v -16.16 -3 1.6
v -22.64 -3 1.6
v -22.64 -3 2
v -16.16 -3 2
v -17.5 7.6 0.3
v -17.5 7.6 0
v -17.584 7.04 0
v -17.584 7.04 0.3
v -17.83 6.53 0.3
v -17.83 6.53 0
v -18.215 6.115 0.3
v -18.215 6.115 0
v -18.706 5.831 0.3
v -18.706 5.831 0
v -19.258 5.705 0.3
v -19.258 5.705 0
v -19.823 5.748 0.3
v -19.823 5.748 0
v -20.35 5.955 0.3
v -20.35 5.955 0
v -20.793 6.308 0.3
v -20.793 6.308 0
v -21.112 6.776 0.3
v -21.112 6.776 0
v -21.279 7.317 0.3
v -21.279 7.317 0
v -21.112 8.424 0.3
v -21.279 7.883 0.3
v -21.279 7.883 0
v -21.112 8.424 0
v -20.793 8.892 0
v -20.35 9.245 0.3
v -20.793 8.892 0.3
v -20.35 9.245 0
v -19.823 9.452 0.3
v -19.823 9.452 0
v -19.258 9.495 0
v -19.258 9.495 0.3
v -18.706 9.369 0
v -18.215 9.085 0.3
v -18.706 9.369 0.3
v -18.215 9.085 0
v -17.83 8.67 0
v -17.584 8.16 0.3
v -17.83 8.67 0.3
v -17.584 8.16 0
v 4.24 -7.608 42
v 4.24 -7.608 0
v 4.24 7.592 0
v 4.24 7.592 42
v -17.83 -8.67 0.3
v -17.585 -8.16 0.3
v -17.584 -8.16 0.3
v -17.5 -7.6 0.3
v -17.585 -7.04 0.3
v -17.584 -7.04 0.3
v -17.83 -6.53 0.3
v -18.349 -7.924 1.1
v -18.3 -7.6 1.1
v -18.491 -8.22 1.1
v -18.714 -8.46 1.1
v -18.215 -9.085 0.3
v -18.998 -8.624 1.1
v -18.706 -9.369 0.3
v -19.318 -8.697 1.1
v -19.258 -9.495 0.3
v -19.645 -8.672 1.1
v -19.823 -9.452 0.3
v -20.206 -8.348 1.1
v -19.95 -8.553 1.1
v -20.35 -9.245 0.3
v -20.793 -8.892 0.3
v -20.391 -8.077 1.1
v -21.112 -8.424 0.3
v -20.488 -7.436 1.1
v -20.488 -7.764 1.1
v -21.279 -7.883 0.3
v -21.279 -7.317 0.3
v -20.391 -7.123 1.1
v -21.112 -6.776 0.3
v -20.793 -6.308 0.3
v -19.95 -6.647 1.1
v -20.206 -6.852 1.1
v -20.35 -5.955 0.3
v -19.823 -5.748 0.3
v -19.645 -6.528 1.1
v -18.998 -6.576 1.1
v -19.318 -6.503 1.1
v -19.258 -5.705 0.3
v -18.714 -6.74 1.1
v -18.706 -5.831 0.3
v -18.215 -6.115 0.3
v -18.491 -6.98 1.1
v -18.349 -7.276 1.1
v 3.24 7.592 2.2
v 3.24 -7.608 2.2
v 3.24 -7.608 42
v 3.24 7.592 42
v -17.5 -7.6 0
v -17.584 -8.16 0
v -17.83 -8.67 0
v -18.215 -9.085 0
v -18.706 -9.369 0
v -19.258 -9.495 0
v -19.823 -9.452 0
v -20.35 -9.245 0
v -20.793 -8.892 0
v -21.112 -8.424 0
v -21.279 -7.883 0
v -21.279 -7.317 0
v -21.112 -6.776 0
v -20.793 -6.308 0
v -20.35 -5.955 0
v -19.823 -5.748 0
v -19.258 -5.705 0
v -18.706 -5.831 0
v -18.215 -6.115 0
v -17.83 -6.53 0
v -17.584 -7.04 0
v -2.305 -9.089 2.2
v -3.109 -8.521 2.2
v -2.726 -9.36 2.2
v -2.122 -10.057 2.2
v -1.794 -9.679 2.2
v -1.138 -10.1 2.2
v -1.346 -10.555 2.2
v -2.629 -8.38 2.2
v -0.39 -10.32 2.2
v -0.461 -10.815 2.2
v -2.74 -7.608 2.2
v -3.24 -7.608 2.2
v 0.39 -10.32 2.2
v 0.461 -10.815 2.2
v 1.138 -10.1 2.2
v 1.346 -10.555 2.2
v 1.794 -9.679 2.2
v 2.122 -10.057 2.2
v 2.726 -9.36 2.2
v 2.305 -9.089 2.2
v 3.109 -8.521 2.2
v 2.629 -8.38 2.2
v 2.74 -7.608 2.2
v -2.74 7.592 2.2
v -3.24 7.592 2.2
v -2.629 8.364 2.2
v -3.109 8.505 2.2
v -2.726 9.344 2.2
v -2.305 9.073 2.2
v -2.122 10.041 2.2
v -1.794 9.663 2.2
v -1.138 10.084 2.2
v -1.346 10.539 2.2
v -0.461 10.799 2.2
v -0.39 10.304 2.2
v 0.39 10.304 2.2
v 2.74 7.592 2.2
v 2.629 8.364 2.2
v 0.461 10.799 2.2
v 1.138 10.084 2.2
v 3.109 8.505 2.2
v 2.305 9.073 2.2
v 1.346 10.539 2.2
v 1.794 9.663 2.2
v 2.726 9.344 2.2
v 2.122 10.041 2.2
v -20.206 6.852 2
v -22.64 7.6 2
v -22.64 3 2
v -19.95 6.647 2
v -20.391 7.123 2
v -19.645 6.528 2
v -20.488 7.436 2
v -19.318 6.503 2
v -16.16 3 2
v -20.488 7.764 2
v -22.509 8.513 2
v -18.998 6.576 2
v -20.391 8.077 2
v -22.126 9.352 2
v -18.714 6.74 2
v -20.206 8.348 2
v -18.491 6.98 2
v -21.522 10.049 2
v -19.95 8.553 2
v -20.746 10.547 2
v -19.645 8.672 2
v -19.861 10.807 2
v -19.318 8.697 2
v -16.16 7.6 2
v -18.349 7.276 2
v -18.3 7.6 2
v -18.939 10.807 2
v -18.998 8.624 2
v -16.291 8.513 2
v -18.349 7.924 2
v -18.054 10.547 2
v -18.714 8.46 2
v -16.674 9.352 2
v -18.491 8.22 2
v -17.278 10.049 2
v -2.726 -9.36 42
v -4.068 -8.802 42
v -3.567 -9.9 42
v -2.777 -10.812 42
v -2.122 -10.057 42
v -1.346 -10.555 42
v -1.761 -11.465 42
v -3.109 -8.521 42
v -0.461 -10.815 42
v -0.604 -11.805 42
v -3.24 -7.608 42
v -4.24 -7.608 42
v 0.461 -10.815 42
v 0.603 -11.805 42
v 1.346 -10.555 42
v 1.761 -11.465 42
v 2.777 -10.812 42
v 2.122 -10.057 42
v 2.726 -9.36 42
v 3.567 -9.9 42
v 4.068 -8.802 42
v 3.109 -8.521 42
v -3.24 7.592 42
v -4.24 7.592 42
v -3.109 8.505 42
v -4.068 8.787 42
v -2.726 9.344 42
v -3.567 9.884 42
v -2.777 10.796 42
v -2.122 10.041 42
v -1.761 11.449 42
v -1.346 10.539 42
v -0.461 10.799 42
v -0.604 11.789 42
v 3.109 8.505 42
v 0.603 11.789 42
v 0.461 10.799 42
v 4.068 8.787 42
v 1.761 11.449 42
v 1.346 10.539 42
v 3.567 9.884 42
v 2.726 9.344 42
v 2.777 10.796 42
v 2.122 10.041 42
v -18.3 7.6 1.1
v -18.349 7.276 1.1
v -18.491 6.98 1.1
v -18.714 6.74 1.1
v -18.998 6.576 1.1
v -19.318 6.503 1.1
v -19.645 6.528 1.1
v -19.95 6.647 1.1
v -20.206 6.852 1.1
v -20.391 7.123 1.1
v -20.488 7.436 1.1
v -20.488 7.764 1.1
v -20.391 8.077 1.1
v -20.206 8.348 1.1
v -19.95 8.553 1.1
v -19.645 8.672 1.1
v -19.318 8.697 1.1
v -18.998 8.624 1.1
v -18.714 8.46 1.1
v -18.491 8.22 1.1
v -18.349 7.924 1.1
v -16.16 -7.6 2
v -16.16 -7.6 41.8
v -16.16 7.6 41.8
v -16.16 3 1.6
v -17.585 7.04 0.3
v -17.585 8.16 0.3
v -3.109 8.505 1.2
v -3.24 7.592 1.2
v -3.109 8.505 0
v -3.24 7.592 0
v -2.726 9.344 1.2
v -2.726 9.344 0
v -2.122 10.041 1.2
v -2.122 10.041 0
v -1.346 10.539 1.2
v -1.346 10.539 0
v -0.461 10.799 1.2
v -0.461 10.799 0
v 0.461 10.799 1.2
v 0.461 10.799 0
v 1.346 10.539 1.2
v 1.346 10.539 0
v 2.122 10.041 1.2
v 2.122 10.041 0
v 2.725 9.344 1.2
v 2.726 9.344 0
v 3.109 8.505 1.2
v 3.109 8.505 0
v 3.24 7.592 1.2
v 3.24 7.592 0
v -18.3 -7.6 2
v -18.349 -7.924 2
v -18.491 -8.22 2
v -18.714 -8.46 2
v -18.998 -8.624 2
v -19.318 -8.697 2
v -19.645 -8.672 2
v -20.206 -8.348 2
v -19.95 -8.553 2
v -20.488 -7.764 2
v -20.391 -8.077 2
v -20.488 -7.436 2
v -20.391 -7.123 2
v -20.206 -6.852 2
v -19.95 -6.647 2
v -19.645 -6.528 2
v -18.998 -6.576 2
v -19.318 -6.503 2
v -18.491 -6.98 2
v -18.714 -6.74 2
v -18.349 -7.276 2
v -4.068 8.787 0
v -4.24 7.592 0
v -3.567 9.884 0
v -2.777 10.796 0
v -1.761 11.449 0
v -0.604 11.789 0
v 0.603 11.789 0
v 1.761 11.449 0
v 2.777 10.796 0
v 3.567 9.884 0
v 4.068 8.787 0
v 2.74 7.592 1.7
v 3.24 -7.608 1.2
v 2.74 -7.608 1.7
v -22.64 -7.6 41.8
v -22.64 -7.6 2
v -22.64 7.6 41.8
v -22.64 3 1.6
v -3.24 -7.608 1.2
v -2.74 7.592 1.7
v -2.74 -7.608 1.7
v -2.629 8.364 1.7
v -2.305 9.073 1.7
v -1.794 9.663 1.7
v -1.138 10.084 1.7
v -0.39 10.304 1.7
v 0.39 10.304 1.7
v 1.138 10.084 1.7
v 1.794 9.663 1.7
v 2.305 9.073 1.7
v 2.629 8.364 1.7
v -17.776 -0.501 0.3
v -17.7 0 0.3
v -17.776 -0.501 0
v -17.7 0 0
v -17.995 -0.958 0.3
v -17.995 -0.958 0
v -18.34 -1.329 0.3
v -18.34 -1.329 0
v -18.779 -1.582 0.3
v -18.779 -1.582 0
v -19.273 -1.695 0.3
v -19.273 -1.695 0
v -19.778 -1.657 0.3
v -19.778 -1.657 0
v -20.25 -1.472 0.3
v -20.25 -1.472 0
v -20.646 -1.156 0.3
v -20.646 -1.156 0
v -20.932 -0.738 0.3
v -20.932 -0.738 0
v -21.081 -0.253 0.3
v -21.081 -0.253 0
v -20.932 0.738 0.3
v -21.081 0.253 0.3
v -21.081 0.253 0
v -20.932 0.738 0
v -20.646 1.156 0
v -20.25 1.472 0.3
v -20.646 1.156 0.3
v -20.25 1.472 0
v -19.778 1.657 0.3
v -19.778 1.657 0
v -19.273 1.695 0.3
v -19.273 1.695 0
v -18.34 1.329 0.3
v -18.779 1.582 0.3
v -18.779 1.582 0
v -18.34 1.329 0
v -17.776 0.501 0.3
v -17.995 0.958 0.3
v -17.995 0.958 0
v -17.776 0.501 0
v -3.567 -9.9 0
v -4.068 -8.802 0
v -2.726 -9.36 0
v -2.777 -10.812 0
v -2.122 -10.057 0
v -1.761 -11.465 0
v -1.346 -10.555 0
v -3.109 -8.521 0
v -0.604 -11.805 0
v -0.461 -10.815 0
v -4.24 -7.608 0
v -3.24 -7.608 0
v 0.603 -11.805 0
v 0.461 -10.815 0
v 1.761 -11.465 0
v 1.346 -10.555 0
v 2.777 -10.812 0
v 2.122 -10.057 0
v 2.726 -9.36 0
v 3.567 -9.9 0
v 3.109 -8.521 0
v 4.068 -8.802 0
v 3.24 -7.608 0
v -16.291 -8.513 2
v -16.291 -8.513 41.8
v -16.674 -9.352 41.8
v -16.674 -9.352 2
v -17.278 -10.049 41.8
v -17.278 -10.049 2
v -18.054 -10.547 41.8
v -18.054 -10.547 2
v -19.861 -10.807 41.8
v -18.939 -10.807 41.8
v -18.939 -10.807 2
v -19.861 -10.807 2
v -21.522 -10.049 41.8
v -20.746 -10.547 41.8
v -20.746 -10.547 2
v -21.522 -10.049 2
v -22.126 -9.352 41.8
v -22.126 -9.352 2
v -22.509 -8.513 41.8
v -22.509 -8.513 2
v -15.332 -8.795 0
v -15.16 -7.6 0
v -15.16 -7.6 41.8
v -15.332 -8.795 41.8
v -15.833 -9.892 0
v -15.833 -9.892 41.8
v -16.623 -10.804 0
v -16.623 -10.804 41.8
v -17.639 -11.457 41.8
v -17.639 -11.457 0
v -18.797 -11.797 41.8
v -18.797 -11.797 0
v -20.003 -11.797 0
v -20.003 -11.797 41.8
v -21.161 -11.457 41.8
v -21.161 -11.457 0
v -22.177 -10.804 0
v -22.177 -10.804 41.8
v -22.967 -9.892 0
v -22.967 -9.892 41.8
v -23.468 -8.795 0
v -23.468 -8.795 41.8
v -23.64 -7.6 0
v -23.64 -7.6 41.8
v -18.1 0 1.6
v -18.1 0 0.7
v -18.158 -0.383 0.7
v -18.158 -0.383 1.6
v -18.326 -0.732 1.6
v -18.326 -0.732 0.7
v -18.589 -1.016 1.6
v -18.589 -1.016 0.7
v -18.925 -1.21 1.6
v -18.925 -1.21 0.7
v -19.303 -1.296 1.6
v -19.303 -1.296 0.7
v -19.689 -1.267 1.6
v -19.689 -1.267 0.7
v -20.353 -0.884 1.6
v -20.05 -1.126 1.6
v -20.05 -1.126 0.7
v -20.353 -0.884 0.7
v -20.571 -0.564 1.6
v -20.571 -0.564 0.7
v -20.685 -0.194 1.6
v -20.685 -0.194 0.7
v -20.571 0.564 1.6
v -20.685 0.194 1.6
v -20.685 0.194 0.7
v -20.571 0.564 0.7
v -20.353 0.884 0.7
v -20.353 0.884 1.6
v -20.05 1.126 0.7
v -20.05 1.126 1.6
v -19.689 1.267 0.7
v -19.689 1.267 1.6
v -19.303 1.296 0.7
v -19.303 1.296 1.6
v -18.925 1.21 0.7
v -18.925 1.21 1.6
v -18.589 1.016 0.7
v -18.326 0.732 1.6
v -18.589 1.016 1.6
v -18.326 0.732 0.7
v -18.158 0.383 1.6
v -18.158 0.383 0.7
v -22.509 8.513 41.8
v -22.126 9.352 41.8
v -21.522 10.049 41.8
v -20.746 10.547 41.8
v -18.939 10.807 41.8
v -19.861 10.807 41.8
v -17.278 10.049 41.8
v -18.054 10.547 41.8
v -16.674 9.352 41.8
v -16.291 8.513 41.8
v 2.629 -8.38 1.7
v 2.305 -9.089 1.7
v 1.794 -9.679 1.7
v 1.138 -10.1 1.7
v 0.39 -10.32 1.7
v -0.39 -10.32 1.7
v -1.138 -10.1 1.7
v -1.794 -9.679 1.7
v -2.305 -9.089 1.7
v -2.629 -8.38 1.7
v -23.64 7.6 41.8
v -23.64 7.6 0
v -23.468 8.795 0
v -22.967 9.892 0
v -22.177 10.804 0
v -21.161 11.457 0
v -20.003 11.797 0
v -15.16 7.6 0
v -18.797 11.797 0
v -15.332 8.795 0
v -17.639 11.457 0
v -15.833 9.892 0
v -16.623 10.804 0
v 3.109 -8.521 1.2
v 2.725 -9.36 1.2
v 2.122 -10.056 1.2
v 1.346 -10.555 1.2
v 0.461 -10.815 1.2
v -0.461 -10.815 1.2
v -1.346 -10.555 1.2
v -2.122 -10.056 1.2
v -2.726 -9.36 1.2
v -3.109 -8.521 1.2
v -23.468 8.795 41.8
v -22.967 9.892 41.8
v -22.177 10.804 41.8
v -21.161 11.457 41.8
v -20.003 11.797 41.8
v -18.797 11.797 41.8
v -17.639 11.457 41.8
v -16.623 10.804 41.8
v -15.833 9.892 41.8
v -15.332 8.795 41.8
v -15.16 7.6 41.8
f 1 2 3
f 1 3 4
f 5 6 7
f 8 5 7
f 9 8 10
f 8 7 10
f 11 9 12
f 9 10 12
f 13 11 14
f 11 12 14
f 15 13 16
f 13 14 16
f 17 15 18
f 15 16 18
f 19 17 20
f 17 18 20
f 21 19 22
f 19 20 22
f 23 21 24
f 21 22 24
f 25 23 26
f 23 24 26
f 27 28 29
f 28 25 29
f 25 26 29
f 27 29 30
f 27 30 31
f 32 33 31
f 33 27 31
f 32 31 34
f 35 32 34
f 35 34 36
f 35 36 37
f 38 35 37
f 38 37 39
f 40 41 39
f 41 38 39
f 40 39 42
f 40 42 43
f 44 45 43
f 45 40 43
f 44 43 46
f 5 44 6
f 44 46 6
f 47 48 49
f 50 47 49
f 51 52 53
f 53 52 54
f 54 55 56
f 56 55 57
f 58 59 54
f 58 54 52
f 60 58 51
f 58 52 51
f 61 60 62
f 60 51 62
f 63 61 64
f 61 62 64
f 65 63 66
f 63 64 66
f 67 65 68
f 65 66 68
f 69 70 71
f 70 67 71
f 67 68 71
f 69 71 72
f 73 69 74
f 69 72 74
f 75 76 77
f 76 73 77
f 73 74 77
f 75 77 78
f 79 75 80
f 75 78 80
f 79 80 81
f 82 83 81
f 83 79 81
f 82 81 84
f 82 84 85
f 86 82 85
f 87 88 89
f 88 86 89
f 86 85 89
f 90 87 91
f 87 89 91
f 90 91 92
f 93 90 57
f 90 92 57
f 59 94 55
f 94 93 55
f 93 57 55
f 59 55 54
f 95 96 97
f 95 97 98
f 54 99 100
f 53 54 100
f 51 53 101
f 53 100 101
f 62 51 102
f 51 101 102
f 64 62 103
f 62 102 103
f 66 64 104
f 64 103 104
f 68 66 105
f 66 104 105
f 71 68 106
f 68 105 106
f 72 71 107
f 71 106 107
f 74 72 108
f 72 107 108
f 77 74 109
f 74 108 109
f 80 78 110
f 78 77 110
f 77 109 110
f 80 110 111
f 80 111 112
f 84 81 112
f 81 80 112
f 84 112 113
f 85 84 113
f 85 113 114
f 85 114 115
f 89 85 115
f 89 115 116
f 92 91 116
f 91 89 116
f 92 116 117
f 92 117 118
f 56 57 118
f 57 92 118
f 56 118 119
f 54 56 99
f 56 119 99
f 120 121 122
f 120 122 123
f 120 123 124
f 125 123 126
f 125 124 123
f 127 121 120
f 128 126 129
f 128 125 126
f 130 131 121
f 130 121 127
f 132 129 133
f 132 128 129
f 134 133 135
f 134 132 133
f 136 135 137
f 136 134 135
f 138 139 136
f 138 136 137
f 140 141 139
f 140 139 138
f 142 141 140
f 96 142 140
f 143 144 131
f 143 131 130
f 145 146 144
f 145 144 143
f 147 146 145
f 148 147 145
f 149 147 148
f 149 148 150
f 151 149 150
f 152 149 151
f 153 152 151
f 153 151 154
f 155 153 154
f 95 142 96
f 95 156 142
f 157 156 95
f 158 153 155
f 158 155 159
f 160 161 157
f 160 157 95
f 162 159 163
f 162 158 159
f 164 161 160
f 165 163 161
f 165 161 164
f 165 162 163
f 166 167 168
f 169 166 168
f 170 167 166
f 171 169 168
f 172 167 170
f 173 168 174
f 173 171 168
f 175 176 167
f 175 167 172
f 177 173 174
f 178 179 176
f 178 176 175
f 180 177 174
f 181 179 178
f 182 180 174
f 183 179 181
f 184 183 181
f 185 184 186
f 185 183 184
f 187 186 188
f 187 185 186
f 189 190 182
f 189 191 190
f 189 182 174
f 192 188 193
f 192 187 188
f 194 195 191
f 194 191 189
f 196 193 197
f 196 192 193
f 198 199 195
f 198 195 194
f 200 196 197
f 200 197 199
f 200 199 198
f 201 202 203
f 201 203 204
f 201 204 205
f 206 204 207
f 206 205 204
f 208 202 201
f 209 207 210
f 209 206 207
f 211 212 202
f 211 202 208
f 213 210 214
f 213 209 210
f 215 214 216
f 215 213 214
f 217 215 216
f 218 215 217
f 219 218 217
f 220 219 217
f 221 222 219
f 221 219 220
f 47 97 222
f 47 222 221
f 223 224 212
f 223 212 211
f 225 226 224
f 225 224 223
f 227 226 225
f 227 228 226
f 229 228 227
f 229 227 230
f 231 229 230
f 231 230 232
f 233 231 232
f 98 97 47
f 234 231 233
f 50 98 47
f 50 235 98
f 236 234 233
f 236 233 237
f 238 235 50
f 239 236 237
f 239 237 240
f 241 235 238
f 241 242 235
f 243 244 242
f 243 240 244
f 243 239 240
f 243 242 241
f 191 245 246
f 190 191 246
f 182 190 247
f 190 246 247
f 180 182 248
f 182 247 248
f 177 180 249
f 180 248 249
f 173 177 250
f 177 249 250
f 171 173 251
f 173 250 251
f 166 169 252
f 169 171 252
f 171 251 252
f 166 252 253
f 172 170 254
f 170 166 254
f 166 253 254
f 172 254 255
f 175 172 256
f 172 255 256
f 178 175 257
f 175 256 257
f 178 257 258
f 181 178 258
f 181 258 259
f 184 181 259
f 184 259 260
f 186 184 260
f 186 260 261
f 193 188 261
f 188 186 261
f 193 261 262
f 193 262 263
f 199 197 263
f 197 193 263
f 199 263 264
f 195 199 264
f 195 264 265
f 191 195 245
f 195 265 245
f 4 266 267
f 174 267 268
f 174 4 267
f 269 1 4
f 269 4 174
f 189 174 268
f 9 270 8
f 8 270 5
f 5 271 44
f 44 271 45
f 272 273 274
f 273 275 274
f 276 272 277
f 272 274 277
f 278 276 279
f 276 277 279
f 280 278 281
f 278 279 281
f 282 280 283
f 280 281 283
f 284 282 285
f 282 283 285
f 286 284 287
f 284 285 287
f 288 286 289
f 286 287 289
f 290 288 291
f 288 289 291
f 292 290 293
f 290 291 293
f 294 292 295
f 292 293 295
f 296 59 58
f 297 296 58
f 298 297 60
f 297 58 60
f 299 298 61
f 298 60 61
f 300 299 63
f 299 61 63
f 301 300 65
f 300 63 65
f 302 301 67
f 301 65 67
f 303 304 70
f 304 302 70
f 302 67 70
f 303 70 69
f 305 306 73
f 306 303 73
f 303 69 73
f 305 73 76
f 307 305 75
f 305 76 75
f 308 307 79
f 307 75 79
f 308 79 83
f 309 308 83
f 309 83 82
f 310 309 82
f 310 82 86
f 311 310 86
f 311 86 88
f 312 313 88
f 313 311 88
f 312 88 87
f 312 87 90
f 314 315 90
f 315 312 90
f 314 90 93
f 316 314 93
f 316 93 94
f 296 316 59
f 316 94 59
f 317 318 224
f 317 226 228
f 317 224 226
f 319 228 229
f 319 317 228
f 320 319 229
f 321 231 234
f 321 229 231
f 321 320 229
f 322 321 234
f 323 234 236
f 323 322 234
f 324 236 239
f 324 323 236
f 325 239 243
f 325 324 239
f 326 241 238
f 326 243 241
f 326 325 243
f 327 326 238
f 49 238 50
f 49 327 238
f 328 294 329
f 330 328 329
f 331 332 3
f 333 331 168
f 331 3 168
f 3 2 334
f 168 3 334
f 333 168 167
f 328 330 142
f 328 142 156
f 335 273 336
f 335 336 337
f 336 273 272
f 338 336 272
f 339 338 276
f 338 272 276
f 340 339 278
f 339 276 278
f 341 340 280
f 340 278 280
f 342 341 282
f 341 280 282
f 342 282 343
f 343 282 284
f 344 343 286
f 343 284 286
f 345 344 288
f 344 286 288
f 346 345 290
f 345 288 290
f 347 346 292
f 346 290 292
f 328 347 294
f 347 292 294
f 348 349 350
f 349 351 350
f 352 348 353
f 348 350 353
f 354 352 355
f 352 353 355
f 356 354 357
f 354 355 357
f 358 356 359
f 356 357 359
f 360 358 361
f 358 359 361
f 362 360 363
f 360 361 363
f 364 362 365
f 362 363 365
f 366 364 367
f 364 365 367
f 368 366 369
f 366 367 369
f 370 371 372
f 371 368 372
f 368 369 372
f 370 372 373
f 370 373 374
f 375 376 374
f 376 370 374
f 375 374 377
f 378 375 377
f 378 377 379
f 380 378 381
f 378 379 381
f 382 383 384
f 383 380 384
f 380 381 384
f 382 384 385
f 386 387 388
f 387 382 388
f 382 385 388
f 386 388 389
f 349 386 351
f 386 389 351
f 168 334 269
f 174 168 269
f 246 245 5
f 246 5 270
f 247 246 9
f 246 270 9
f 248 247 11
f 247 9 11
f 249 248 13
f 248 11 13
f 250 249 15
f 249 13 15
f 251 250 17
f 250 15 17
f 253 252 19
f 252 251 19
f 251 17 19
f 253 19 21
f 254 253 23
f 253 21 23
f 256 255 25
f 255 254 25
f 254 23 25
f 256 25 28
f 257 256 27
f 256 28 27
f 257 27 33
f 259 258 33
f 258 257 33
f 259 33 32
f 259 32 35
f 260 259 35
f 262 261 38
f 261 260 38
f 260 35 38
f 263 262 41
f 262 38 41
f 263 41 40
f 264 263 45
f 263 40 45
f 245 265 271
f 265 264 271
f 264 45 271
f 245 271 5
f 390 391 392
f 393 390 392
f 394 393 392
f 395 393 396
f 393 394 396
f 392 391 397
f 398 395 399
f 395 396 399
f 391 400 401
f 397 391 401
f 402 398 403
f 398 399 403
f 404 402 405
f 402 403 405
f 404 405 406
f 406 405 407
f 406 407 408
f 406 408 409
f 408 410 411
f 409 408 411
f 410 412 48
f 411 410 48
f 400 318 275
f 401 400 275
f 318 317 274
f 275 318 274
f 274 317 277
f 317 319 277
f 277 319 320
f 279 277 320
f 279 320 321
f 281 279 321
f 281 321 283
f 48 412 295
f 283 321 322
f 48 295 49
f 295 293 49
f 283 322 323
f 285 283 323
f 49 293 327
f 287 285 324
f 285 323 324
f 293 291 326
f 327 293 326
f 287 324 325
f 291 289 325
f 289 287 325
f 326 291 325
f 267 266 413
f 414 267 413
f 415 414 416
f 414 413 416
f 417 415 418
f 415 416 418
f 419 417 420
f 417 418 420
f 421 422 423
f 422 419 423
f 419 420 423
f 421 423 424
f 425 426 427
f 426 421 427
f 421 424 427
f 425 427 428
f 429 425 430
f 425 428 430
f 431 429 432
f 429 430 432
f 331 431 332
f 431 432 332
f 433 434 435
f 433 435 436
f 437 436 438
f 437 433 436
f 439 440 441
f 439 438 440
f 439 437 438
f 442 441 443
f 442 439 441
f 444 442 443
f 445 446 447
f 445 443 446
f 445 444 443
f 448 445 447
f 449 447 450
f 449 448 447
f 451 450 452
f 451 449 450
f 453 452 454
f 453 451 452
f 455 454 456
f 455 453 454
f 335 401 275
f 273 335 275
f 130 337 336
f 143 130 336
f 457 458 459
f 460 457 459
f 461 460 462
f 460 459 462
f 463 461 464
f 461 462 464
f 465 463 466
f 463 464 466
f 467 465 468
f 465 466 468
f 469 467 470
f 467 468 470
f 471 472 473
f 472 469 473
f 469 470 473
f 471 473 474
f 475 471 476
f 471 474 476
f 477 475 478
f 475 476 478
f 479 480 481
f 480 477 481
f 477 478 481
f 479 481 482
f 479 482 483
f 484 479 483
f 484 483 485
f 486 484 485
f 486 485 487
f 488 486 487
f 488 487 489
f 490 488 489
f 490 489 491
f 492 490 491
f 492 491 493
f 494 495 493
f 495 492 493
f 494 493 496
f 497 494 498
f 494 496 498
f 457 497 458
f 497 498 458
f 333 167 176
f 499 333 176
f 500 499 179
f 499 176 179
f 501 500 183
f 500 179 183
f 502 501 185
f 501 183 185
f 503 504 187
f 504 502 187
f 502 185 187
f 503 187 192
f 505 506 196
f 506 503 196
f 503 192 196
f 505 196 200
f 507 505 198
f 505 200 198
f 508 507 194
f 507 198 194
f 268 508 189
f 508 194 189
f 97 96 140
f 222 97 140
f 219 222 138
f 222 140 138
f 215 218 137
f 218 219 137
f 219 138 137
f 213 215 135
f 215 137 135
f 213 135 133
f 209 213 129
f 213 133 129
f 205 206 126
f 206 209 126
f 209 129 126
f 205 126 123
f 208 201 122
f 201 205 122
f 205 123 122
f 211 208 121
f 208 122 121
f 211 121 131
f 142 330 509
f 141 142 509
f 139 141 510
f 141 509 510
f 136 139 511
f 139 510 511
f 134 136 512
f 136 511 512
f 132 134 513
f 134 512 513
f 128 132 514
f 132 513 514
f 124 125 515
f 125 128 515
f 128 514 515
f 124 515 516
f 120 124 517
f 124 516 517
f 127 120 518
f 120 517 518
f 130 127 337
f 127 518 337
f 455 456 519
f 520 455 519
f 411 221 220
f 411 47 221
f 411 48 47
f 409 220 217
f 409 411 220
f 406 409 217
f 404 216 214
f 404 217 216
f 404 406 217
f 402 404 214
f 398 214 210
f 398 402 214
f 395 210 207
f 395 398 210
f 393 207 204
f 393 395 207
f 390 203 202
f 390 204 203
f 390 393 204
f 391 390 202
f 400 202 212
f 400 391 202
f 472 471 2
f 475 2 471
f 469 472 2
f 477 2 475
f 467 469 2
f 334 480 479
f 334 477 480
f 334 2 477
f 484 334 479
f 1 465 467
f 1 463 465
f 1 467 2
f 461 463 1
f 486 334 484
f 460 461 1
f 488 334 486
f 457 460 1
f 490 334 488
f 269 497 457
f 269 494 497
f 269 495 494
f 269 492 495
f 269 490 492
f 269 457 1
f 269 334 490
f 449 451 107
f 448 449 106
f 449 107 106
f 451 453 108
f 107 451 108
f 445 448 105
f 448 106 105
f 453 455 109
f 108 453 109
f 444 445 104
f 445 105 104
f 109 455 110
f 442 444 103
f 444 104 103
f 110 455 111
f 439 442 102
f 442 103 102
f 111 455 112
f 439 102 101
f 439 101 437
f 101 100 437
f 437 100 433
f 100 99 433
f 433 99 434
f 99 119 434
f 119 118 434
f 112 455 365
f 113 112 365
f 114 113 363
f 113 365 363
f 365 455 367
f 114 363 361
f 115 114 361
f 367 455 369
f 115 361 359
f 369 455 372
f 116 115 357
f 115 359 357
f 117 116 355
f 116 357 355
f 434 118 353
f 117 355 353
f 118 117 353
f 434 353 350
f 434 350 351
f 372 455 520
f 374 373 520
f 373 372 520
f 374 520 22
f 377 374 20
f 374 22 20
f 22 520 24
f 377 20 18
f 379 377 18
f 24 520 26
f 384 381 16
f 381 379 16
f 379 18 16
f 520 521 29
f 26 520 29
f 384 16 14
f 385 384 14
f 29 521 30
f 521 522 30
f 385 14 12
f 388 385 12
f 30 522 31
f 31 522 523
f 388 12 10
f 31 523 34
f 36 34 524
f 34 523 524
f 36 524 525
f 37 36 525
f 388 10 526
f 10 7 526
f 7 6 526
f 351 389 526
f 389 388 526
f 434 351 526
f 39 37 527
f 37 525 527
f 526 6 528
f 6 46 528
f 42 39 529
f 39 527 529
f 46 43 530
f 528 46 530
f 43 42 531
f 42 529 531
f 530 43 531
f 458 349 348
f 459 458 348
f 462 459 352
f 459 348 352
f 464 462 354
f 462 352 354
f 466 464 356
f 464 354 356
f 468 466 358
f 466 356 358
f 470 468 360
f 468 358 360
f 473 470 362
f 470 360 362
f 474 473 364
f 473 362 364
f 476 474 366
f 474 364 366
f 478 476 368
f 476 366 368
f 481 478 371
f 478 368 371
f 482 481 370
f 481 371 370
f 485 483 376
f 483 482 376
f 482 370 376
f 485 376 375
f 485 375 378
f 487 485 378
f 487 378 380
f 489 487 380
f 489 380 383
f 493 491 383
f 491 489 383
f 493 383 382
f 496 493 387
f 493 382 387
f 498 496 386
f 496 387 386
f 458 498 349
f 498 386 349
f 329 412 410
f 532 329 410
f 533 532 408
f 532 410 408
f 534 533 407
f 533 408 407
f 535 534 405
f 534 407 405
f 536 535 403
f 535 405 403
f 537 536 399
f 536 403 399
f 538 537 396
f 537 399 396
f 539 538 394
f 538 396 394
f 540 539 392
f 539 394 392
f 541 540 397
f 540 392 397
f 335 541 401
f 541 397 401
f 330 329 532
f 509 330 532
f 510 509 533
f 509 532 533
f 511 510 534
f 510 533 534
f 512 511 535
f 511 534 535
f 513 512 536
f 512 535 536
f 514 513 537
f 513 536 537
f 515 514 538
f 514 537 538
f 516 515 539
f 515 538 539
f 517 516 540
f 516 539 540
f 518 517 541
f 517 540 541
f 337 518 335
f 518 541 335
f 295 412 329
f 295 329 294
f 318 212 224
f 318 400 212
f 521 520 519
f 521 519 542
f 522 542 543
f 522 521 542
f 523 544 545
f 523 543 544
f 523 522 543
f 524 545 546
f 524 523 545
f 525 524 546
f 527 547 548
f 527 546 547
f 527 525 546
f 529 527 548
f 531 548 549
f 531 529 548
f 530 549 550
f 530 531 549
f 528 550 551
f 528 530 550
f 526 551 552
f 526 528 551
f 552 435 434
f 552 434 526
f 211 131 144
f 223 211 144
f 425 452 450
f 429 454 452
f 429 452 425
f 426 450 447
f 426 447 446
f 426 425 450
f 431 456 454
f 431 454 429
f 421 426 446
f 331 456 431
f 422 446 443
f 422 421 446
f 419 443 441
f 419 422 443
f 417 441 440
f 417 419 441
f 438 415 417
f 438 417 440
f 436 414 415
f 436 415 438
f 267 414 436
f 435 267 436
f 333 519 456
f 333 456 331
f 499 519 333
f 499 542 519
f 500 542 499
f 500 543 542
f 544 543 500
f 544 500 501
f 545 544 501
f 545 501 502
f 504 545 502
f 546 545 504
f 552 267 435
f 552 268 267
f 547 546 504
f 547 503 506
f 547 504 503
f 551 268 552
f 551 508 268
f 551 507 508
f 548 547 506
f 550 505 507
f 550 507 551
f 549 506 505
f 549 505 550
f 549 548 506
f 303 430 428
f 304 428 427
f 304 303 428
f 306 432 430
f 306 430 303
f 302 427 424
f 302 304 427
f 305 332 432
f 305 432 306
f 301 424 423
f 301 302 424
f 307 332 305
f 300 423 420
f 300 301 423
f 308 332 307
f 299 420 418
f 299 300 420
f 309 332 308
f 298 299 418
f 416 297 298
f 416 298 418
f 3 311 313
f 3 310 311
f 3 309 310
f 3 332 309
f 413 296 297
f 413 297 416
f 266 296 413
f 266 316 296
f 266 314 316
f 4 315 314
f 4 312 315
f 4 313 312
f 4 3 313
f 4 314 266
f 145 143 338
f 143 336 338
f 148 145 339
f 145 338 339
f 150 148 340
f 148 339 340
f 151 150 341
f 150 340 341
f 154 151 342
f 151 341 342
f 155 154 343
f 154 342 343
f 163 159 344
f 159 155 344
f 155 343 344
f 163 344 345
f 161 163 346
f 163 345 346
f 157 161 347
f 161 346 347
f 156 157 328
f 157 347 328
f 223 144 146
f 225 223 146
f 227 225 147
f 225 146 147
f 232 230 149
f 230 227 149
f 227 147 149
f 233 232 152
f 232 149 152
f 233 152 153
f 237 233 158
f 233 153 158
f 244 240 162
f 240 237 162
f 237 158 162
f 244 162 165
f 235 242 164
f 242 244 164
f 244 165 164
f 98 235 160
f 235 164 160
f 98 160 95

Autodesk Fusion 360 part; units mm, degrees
sketch "shuffle-cover" plane through (0, 0, 0) normal (0, 0, 1) x (1, 0, 0)
  circle A0 centre (-0.0001, 7.5921) radius 1.1 construction
  line L0 (-3.2401, 2.9921) -> (3.2399, 2.9921) construction
  line L1 (-2.7401, -7.6079) -> (-2.7401, 7.5921)
  arc A1 (3.2399, 7.5921) -> (-3.2401, 7.5921) centre (-0.0001, 7.5921) ccw
  line L2 (3.2399, -7.6079) -> (3.2399, 7.5921)
  arc A2 (-2.7401, -7.6079) -> (2.7399, -7.6079) centre (-0.0001, -7.6079) ccw
  circle A3 centre (-0.0001, -0.0079) radius 1.7 construction
  arc A4 (-3.2401, -7.6079) -> (3.2399, -7.6079) centre (-0.0001, -7.6079) ccw
  circle A5 centre (-0.0001, 7.5921) radius 1.9 construction
  line L3 (2.7399, -7.6079) -> (2.7399, 7.5921)
  line L4 (-3.2401, -7.6079) -> (-3.2401, 7.5921)
  arc A6 (2.7399, 7.5921) -> (-2.7401, 7.5921) centre (-0.0001, 7.5921) ccw
  circle A7 centre (-0.0001, -7.6079) radius 1.9 construction
  circle A8 centre (-0.0001, -7.6079) radius 1.1 construction
  circle A9 centre (-0.0001, -0.0079) radius 1.3 construction
  line L5 (-3.2401, -3.0079) -> (3.2399, -3.0079) construction
  line L6 (-23.64, -7.6) -> (-23.64, 7.6)
  circle A10 centre (-19.4, -7.6) radius 1.9
  arc A11 (-15.16, 7.6) -> (-23.64, 7.6) centre (-19.4, 7.6) ccw
  circle A12 centre (-19.4, 7.6) radius 1.1
  line L7 (-22.64, -3) -> (-16.16, -3)
  arc A13 (-23.64, -7.6) -> (-15.16, -7.6) centre (-19.4, -7.6) ccw
  arc A14 (-16.16, 7.6) -> (-22.64, 7.6) centre (-19.4, 7.6) ccw
  line L8 (-22.64, -7.6) -> (-22.64, 7.6)
  arc A15 (-22.64, -7.6) -> (-16.16, -7.6) centre (-19.4, -7.6) ccw
  circle A16 centre (-19.4, 0) radius 1.3
  circle A17 centre (-19.4, 0) radius 1.7
  line L9 (-16.16, -7.6) -> (-16.16, 7.6)
  circle A18 centre (-19.4, 7.6) radius 1.9
  line L10 (-15.16, -7.6) -> (-15.16, 7.6)
  circle A19 centre (-19.4, -7.6) radius 1.1
  line L11 (-22.64, 3) -> (-16.16, 3)
  arc A20 (4.2399, 7.5921) -> (-4.2401, 7.5921) centre (-0.0001, 7.5921) ccw
  line L12 (-4.2401, -7.6079) -> (-4.2401, 7.5921)
  arc A21 (-4.2401, -7.6079) -> (4.2399, -7.6079) centre (-0.0001, -7.6079) ccw
  line L13 (4.2399, -7.6079) -> (4.2399, 7.5921)
  point P0 (-0.0001, -0.0079)
  point P1 (-0.0001, -0.0079)
  point P2 (-19.4, 0)
  point P3 (-19.4, 0)
  dimension "d1" = 2.6
  dimension "d2" = 3.8
  dimension "d3" = 2.2
  dimension "d4" = 3.8
  dimension "d5" = 2.2
  dimension "d6" = 3.4
  dimension "d7" = 2.6
  dimension "d8" = 3.8
  dimension "d9" = 2.2
  dimension "d10" = 3.8
  dimension "d11" = 2.2
  dimension "d12" = 3.4
extrude "Extrude36" add sketch "shuffle-cover" along normal blind 2 contours A10 | L7 L8 A15 L9 | A14 L8 L9 L11 | A18 makes body 1 at (-19.4274, -4.1677, 0) makes body 2 at (-19.3726, 4.1677, 0)
extrude "Extrude37" add sketch "shuffle-cover" along normal blind 1.6 contours L7 L8 L9 L11 | A17 bodies 1 2
extrude "Extrude38" add sketch "shuffle-cover" along normal blind 41.8 contours L6 A11 A13 L10 bodies 1
extrude "Extrude39" cut sketch "shuffle-cover" along normal blind 0.3 contours A10 | A17 | A18 bodies 1
chamfer "Chamfer19" distance 0.8 angle 45 2 edges at (-19.7978, -8.6256, 0.3) (-19.7978, 6.5744, 0.3) measured on face at (-18.3055, -7.7095, 0.8667) measured on face at (-19.6979, 8.6589, 0.8667) on bodies 1
chamfer "Chamfer20" distance 0.4 angle 45 1 edges at (-19.8701, -1.212, 0.3) measured on face at (-18.1065, -0.1294, 0.7333) on bodies 1
extrude "Extrude40" add sketch "shuffle-cover" along normal blind 1 from surface at 1.2 separate body contours A1 L2 A4 L4 makes body 3
chamfer "Chamfer21" distance 0.5 angle 45 4 edges at (-2.7401, -0.0079, 1.2) (-0.0001, 10.3321, 1.2) (2.7399, -0.0079, 1.2) (-0.0001, -10.3479, 1.2) measured on face at (-2.7401, -2.5412, 1.5333) measured on face at (-2.7367, 7.7287, 1.8667) measured on face at (2.7399, 2.5254, 1.8667) measured on face at (2.5746, -8.545, 1.8667) on bodies 3
extrude "Extrude41" add sketch "shuffle-cover" along normal blind 42 contours A20 L12 A21 L13 bodies 3
